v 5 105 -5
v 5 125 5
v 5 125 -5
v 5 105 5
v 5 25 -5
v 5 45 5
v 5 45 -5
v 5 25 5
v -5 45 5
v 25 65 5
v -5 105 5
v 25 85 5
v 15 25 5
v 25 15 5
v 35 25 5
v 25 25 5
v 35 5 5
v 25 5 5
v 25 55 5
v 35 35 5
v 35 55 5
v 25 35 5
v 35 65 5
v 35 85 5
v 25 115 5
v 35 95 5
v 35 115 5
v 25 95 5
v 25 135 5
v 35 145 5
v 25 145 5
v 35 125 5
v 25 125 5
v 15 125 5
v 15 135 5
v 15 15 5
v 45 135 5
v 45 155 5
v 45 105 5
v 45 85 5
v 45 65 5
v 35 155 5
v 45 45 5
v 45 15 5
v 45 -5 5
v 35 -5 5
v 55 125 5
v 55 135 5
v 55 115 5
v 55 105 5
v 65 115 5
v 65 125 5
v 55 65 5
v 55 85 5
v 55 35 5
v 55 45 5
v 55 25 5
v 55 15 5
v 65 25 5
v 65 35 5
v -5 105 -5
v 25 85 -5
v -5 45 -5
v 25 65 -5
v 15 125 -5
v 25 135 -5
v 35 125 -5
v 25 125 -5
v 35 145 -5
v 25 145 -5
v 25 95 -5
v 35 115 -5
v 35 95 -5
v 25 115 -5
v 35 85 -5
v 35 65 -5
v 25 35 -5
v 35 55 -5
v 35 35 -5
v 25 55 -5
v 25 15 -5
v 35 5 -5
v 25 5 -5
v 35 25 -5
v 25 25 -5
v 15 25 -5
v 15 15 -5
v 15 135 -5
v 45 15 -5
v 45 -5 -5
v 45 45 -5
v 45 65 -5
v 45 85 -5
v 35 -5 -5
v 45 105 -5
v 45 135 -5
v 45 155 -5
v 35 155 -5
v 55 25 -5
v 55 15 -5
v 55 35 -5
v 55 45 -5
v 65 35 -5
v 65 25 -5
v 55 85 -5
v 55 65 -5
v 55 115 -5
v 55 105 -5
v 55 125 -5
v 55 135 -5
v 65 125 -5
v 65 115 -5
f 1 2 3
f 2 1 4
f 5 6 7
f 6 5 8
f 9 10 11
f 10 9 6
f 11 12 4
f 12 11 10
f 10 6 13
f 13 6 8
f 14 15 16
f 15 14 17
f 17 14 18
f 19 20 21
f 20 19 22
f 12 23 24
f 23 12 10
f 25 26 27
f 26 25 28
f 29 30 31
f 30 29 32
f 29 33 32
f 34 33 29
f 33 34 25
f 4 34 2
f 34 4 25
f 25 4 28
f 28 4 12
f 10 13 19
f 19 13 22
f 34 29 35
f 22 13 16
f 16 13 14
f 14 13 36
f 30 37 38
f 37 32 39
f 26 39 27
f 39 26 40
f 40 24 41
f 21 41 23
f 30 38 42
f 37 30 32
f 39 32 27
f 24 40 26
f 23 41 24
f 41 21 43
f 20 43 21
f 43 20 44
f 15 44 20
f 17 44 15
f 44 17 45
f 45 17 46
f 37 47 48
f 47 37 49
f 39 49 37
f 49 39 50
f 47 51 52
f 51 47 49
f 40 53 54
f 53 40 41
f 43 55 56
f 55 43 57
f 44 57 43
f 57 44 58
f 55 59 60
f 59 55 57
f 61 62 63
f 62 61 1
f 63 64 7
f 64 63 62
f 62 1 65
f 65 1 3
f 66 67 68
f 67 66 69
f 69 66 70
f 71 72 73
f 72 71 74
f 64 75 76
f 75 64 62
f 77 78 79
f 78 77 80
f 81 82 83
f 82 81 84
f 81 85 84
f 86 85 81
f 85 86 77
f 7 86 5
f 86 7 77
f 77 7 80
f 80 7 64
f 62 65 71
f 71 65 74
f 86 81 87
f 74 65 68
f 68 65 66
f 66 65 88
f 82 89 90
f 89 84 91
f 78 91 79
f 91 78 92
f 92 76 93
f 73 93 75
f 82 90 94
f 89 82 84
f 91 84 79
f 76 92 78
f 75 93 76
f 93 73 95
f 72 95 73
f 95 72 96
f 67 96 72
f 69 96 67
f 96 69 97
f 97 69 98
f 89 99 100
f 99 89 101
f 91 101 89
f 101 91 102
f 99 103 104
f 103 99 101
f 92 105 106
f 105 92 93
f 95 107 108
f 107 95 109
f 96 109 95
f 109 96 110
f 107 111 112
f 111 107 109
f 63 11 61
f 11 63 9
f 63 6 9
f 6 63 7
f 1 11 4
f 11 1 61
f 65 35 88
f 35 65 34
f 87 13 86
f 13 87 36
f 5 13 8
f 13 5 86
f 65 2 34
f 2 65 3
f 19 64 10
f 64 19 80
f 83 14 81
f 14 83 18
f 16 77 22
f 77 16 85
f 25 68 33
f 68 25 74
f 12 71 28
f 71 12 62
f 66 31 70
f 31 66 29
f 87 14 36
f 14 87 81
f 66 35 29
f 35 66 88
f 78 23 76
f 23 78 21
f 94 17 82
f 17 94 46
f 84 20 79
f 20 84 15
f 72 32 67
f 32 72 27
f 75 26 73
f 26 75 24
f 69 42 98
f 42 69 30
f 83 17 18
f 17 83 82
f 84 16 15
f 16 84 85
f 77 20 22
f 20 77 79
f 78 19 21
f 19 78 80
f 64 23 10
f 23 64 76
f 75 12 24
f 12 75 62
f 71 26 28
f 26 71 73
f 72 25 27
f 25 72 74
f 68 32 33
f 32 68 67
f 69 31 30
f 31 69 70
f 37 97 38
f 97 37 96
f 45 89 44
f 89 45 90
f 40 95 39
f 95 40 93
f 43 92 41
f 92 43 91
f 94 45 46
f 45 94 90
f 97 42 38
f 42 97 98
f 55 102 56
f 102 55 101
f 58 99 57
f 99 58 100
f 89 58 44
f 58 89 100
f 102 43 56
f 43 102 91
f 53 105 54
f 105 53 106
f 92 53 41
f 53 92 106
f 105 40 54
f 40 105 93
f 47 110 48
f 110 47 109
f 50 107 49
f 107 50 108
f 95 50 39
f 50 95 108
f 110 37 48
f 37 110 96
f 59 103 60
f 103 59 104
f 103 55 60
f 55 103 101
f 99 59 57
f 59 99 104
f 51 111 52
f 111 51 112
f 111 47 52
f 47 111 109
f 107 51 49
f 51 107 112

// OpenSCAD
/***********************************************************************
Name ......... : spaceInvaders.scad
Description....: Space Invaders
Author ....... : Garrett Melenka
Version ...... : V1.0 2016/10/15
Licence ...... : GPL
***********************************************************************/

//Dimensions for Space Invaders
//Pixel Size- size of each square
pixelSize = 10;
//Pixel Height- height of each square
pixelHeight = 10;


invaderSelect = 4; //[1:Invader 01, 2:Invader 02, 3:Invader 03, 4: Space Ship, 5: Gun Ship ]

//Matricies to setup the different space invaders
invader01 = [[0,0,1,1,0,0,0,1,1,0,0],
             [0,0,0,1,0,0,0,1,0,0,0],
             [0,0,1,1,1,1,1,1,1,0,0],
             [0,1,1,0,1,1,1,0,1,1,0],
             [1,1,1,1,1,1,1,1,1,1,1],
             [1,0,1,1,1,1,1,1,1,0,1],
             [1,0,1,0,0,0,0,0,1,0,1],
             [0,0,1,1,1,0,1,1,1,0,0]];

invader02 = [[0,0,0,0,0,1,1,0,0,0,0],
             [0,0,0,0,1,1,1,1,0,0,0],
             [0,0,0,1,1,1,1,1,1,0,0],
             [0,0,1,1,0,1,1,0,1,1,0],
             [0,0,1,1,1,1,1,1,1,1,0],
             [0,0,0,0,1,0,0,1,0,0,0],
             [0,0,0,1,1,1,1,1,1,0,0],
             [0,0,1,1,1,0,0,1,1,1,0]];
             
invader03 = [[0,0,0,0,0,1,1,1,1,0,0,0,0,0],
             [0,0,1,1,1,1,1,1,1,1,1,1,0,0],
             [0,1,1,1,1,1,1,1,1,1,1,1,1,0],
             [0,1,1,1,0,0,1,1,0,0,1,1,1,0],
             [0,1,1,1,1,1,1,1,1,1,1,1,1,0],
             [0,0,0,1,1,1,1,1,1,1,1,0,0,0],
             [0,0,1,1,0,0,1,1,0,0,1,1,0,0],
             [0,0,0,1,1,0,0,0,0,1,1,0,0,0]];
             
invader04 = [[0,0,0,0,0,1,1,1,1,1,1,0,0,0,0,0],
             [0,0,0,1,1,1,1,1,1,1,1,1,1,0,0,0],
             [0,0,1,1,1,1,1,1,1,1,1,1,1,1,0,0],
             [0,1,1,0,1,1,0,1,1,0,1,1,0,1,1,0],
             [1,1,1,1,1,1,1,1,1,1,1,1,1,1,1,1],
             [0,0,1,1,1,0,0,1,1,0,0,1,1,1,0,0],
             [0,0,0,1,0,0,0,0,0,0,0,0,1,0,0,0]];
             
invader05 = [[0,0,0,0,0,0,1,0,0,0,0,0,0],
             [0,0,0,0,0,1,1,1,0,0,0,0,0],
             [0,0,0,0,0,1,1,1,0,0,0,0,0],
             [0,0,0,0,0,1,1,1,0,0,0,0,0],
             [0,1,1,1,1,1,1,1,1,1,1,1,0],
             [1,1,1,1,1,1,1,1,1,1,1,1,1],
             [1,1,1,1,1,1,1,1,1,1,1,1,1],
             [1,1,1,1,1,1,1,1,1,1,1,1,1],
             [1,1,1,1,1,1,1,1,1,1,1,1,1]];
                    
             


module pixel()
{
    
    cube(size = [pixelSize, pixelSize, pixelHeight], center = true);
}


module invader()
{
    
    for(i = [0:8])
    {
        for(j = [0:15])
        {
            //invader 01.
            if (invaderSelect ==1)
            {
            if (invader01[i][j] == 1)
            {
                    
            
            translate([pixelSize*i, pixelSize*j,0])
            {
                pixel();
            }
            }
                        
            }
            //invader 2
            if (invaderSelect == 2)
            {
            if (invader02[i][j] == 1)
            {
                    
            
            translate([pixelSize*i, pixelSize*j,0])
            {
                pixel(); 
            }
            }
            }
            //invader 3
            if (invaderSelect == 3)
            {
            //echo(invader01[i][j]);
            if (invader03[i][j] == 1)
            {
                    
            
            translate([pixelSize*i, pixelSize*j,0])
            {
                pixel(); 
            }
            }
            }
            //space ship
            if (invaderSelect == 4)
            {
            
            if (invader04[i][j] == 1)
            {
                    
            
            translate([pixelSize*i, pixelSize*j,0])
            {
                pixel(); 
            }
            }
            }
            
            //Gun ship
            if (invaderSelect == 5)
            {
            if (invader05[i][j] == 1)
            {
                    
            
            translate([pixelSize*i, pixelSize*j,0])
            {
                pixel(); 
            }
            }
            }
            
        }
    }
    
    
    
}
//Show the space invader
invader();
